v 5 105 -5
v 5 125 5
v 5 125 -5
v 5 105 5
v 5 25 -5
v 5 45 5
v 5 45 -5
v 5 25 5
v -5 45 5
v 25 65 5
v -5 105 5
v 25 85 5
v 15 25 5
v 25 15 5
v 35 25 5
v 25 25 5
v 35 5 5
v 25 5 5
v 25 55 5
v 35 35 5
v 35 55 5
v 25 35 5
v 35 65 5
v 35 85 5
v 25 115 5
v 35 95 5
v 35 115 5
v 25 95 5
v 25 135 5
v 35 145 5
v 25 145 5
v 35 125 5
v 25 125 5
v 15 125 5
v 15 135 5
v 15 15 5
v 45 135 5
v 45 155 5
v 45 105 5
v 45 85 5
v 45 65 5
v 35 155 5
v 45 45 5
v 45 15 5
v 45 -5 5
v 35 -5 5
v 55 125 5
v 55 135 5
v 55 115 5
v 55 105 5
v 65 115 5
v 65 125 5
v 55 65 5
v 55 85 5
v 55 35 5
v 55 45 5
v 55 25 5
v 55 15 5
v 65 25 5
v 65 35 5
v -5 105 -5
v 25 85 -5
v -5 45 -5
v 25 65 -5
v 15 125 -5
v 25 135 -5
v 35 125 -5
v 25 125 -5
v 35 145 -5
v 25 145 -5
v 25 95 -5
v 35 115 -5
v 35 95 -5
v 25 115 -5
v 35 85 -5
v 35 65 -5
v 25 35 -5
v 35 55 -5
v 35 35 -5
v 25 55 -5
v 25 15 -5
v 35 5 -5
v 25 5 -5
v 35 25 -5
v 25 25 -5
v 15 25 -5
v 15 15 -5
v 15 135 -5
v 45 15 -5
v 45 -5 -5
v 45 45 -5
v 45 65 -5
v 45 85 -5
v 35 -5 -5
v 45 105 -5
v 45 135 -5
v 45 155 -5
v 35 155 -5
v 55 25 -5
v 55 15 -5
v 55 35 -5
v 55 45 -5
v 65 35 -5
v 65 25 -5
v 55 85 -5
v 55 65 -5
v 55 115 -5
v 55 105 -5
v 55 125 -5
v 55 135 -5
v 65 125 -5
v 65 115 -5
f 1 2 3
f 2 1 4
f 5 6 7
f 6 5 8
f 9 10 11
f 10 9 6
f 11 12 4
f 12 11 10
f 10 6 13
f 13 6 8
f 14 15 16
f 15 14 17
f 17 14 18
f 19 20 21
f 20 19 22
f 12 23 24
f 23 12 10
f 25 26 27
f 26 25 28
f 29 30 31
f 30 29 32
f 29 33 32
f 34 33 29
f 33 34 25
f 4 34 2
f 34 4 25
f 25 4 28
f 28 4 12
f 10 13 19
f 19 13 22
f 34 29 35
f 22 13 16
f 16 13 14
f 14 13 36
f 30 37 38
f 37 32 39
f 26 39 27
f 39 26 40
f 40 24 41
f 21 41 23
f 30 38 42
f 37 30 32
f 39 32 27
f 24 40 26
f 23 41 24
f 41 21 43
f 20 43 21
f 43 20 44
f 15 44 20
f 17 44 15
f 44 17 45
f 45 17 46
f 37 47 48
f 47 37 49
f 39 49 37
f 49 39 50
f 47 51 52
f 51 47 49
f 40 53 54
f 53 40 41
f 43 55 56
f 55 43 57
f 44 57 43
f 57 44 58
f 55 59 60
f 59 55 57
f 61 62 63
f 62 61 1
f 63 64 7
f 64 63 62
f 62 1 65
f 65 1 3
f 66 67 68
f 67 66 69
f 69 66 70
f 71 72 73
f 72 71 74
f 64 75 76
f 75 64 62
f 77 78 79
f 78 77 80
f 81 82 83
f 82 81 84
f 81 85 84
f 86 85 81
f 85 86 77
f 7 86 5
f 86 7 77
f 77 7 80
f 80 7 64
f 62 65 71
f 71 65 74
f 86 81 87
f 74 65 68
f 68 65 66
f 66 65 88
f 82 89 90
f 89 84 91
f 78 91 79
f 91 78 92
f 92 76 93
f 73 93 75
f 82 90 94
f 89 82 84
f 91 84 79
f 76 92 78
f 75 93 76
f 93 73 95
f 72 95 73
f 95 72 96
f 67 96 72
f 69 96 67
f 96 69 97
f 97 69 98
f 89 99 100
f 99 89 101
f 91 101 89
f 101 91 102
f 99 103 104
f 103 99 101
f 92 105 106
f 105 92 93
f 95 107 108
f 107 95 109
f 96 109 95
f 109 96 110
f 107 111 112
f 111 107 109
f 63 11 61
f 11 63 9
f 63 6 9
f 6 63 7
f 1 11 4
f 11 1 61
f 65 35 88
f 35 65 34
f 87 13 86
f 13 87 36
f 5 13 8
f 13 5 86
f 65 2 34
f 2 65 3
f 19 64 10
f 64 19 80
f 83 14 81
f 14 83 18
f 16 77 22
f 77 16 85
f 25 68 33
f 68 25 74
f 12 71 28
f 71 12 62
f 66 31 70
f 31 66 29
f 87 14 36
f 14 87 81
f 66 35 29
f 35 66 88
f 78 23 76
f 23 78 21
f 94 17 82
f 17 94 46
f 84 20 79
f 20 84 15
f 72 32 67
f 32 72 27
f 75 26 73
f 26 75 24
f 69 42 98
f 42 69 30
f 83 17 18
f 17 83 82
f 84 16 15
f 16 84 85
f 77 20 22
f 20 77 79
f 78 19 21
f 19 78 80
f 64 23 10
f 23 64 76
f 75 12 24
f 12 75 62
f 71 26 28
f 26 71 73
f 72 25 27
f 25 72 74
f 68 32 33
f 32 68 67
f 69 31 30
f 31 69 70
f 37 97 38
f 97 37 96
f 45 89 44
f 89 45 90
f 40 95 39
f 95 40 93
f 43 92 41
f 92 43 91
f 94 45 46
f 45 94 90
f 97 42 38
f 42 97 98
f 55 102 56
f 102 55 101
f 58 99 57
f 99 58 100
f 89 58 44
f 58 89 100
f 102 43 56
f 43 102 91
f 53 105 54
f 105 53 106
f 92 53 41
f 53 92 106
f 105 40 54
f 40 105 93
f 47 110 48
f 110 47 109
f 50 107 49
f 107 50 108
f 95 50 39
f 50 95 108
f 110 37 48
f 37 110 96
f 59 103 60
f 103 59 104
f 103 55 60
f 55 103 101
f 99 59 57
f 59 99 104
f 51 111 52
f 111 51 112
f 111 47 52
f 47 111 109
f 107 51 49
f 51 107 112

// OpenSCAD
/***********************************************************************
Name ......... : spaceInvaders.scad
Description....: Space Invaders
Author ....... : Garrett Melenka
Version ...... : V1.0 2016/10/15
Licence ...... : GPL
***********************************************************************/

//Dimensions for Space Invaders
//Pixel Size- size of each square
pixelSize = 10;
//Pixel Height- height of each square
pixelHeight = 10;


invaderSelect = 4; //[1:Invader 01, 2:Invader 02, 3:Invader 03, 4: Space Ship, 5: Gun Ship ]

//Matricies to setup the different space invaders
invader01 = [[0,0,1,1,0,0,0,1,1,0,0],
             [0,0,0,1,0,0,0,1,0,0,0],
             [0,0,1,1,1,1,1,1,1,0,0],
             [0,1,1,0,1,1,1,0,1,1,0],
             [1,1,1,1,1,1,1,1,1,1,1],
             [1,0,1,1,1,1,1,1,1,0,1],
             [1,0,1,0,0,0,0,0,1,0,1],
             [0,0,1,1,1,0,1,1,1,0,0]];

invader02 = [[0,0,0,0,0,1,1,0,0,0,0],
             [0,0,0,0,1,1,1,1,0,0,0],
             [0,0,0,1,1,1,1,1,1,0,0],
             [0,0,1,1,0,1,1,0,1,1,0],
             [0,0,1,1,1,1,1,1,1,1,0],
             [0,0,0,0,1,0,0,1,0,0,0],
             [0,0,0,1,1,1,1,1,1,0,0],
             [0,0,1,1,1,0,0,1,1,1,0]];
             
invader03 = [[0,0,0,0,0,1,1,1,1,0,0,0,0,0],
             [0,0,1,1,1,1,1,1,1,1,1,1,0,0],
             [0,1,1,1,1,1,1,1,1,1,1,1,1,0],
             [0,1,1,1,0,0,1,1,0,0,1,1,1,0],
             [0,1,1,1,1,1,1,1,1,1,1,1,1,0],
             [0,0,0,1,1,1,1,1,1,1,1,0,0,0],
             [0,0,1,1,0,0,1,1,0,0,1,1,0,0],
             [0,0,0,1,1,0,0,0,0,1,1,0,0,0]];
             
invader04 = [[0,0,0,0,0,1,1,1,1,1,1,0,0,0,0,0],
             [0,0,0,1,1,1,1,1,1,1,1,1,1,0,0,0],
             [0,0,1,1,1,1,1,1,1,1,1,1,1,1,0,0],
             [0,1,1,0,1,1,0,1,1,0,1,1,0,1,1,0],
             [1,1,1,1,1,1,1,1,1,1,1,1,1,1,1,1],
             [0,0,1,1,1,0,0,1,1,0,0,1,1,1,0,0],
             [0,0,0,1,0,0,0,0,0,0,0,0,1,0,0,0]];
             
invader05 = [[0,0,0,0,0,0,1,0,0,0,0,0,0],
             [0,0,0,0,0,1,1,1,0,0,0,0,0],
             [0,0,0,0,0,1,1,1,0,0,0,0,0],
             [0,0,0,0,0,1,1,1,0,0,0,0,0],
             [0,1,1,1,1,1,1,1,1,1,1,1,0],
             [1,1,1,1,1,1,1,1,1,1,1,1,1],
             [1,1,1,1,1,1,1,1,1,1,1,1,1],
             [1,1,1,1,1,1,1,1,1,1,1,1,1],
             [1,1,1,1,1,1,1,1,1,1,1,1,1]];
                    
             


module pixel()
{
    
    cube(size = [pixelSize, pixelSize, pixelHeight], center = true);
}


module invader()
{
    
    for(i = [0:8])
    {
        for(j = [0:15])
        {
            //invader 01.
            if (invaderSelect ==1)
            {
            if (invader01[i][j] == 1)
            {
                    
            
            translate([pixelSize*i, pixelSize*j,0])
            {
                pixel();
            }
            }
                        
            }
            //invader 2
            if (invaderSelect == 2)
            {
            if (invader02[i][j] == 1)
            {
                    
            
            translate([pixelSize*i, pixelSize*j,0])
            {
                pixel(); 
            }
            }
            }
            //invader 3
            if (invaderSelect == 3)
            {
            //echo(invader01[i][j]);
            if (invader03[i][j] == 1)
            {
                    
            
            translate([pixelSize*i, pixelSize*j,0])
            {
                pixel(); 
            }
            }
            }
            //space ship
            if (invaderSelect == 4)
            {
            
            if (invader04[i][j] == 1)
            {
                    
            
            translate([pixelSize*i, pixelSize*j,0])
            {
                pixel(); 
            }
            }
            }
            
            //Gun ship
            if (invaderSelect == 5)
            {
            if (invader05[i][j] == 1)
            {
                    
            
            translate([pixelSize*i, pixelSize*j,0])
            {
                pixel(); 
            }
            }
            }
            
        }
    }
    
    
    
}
//Show the space invader
invader();
